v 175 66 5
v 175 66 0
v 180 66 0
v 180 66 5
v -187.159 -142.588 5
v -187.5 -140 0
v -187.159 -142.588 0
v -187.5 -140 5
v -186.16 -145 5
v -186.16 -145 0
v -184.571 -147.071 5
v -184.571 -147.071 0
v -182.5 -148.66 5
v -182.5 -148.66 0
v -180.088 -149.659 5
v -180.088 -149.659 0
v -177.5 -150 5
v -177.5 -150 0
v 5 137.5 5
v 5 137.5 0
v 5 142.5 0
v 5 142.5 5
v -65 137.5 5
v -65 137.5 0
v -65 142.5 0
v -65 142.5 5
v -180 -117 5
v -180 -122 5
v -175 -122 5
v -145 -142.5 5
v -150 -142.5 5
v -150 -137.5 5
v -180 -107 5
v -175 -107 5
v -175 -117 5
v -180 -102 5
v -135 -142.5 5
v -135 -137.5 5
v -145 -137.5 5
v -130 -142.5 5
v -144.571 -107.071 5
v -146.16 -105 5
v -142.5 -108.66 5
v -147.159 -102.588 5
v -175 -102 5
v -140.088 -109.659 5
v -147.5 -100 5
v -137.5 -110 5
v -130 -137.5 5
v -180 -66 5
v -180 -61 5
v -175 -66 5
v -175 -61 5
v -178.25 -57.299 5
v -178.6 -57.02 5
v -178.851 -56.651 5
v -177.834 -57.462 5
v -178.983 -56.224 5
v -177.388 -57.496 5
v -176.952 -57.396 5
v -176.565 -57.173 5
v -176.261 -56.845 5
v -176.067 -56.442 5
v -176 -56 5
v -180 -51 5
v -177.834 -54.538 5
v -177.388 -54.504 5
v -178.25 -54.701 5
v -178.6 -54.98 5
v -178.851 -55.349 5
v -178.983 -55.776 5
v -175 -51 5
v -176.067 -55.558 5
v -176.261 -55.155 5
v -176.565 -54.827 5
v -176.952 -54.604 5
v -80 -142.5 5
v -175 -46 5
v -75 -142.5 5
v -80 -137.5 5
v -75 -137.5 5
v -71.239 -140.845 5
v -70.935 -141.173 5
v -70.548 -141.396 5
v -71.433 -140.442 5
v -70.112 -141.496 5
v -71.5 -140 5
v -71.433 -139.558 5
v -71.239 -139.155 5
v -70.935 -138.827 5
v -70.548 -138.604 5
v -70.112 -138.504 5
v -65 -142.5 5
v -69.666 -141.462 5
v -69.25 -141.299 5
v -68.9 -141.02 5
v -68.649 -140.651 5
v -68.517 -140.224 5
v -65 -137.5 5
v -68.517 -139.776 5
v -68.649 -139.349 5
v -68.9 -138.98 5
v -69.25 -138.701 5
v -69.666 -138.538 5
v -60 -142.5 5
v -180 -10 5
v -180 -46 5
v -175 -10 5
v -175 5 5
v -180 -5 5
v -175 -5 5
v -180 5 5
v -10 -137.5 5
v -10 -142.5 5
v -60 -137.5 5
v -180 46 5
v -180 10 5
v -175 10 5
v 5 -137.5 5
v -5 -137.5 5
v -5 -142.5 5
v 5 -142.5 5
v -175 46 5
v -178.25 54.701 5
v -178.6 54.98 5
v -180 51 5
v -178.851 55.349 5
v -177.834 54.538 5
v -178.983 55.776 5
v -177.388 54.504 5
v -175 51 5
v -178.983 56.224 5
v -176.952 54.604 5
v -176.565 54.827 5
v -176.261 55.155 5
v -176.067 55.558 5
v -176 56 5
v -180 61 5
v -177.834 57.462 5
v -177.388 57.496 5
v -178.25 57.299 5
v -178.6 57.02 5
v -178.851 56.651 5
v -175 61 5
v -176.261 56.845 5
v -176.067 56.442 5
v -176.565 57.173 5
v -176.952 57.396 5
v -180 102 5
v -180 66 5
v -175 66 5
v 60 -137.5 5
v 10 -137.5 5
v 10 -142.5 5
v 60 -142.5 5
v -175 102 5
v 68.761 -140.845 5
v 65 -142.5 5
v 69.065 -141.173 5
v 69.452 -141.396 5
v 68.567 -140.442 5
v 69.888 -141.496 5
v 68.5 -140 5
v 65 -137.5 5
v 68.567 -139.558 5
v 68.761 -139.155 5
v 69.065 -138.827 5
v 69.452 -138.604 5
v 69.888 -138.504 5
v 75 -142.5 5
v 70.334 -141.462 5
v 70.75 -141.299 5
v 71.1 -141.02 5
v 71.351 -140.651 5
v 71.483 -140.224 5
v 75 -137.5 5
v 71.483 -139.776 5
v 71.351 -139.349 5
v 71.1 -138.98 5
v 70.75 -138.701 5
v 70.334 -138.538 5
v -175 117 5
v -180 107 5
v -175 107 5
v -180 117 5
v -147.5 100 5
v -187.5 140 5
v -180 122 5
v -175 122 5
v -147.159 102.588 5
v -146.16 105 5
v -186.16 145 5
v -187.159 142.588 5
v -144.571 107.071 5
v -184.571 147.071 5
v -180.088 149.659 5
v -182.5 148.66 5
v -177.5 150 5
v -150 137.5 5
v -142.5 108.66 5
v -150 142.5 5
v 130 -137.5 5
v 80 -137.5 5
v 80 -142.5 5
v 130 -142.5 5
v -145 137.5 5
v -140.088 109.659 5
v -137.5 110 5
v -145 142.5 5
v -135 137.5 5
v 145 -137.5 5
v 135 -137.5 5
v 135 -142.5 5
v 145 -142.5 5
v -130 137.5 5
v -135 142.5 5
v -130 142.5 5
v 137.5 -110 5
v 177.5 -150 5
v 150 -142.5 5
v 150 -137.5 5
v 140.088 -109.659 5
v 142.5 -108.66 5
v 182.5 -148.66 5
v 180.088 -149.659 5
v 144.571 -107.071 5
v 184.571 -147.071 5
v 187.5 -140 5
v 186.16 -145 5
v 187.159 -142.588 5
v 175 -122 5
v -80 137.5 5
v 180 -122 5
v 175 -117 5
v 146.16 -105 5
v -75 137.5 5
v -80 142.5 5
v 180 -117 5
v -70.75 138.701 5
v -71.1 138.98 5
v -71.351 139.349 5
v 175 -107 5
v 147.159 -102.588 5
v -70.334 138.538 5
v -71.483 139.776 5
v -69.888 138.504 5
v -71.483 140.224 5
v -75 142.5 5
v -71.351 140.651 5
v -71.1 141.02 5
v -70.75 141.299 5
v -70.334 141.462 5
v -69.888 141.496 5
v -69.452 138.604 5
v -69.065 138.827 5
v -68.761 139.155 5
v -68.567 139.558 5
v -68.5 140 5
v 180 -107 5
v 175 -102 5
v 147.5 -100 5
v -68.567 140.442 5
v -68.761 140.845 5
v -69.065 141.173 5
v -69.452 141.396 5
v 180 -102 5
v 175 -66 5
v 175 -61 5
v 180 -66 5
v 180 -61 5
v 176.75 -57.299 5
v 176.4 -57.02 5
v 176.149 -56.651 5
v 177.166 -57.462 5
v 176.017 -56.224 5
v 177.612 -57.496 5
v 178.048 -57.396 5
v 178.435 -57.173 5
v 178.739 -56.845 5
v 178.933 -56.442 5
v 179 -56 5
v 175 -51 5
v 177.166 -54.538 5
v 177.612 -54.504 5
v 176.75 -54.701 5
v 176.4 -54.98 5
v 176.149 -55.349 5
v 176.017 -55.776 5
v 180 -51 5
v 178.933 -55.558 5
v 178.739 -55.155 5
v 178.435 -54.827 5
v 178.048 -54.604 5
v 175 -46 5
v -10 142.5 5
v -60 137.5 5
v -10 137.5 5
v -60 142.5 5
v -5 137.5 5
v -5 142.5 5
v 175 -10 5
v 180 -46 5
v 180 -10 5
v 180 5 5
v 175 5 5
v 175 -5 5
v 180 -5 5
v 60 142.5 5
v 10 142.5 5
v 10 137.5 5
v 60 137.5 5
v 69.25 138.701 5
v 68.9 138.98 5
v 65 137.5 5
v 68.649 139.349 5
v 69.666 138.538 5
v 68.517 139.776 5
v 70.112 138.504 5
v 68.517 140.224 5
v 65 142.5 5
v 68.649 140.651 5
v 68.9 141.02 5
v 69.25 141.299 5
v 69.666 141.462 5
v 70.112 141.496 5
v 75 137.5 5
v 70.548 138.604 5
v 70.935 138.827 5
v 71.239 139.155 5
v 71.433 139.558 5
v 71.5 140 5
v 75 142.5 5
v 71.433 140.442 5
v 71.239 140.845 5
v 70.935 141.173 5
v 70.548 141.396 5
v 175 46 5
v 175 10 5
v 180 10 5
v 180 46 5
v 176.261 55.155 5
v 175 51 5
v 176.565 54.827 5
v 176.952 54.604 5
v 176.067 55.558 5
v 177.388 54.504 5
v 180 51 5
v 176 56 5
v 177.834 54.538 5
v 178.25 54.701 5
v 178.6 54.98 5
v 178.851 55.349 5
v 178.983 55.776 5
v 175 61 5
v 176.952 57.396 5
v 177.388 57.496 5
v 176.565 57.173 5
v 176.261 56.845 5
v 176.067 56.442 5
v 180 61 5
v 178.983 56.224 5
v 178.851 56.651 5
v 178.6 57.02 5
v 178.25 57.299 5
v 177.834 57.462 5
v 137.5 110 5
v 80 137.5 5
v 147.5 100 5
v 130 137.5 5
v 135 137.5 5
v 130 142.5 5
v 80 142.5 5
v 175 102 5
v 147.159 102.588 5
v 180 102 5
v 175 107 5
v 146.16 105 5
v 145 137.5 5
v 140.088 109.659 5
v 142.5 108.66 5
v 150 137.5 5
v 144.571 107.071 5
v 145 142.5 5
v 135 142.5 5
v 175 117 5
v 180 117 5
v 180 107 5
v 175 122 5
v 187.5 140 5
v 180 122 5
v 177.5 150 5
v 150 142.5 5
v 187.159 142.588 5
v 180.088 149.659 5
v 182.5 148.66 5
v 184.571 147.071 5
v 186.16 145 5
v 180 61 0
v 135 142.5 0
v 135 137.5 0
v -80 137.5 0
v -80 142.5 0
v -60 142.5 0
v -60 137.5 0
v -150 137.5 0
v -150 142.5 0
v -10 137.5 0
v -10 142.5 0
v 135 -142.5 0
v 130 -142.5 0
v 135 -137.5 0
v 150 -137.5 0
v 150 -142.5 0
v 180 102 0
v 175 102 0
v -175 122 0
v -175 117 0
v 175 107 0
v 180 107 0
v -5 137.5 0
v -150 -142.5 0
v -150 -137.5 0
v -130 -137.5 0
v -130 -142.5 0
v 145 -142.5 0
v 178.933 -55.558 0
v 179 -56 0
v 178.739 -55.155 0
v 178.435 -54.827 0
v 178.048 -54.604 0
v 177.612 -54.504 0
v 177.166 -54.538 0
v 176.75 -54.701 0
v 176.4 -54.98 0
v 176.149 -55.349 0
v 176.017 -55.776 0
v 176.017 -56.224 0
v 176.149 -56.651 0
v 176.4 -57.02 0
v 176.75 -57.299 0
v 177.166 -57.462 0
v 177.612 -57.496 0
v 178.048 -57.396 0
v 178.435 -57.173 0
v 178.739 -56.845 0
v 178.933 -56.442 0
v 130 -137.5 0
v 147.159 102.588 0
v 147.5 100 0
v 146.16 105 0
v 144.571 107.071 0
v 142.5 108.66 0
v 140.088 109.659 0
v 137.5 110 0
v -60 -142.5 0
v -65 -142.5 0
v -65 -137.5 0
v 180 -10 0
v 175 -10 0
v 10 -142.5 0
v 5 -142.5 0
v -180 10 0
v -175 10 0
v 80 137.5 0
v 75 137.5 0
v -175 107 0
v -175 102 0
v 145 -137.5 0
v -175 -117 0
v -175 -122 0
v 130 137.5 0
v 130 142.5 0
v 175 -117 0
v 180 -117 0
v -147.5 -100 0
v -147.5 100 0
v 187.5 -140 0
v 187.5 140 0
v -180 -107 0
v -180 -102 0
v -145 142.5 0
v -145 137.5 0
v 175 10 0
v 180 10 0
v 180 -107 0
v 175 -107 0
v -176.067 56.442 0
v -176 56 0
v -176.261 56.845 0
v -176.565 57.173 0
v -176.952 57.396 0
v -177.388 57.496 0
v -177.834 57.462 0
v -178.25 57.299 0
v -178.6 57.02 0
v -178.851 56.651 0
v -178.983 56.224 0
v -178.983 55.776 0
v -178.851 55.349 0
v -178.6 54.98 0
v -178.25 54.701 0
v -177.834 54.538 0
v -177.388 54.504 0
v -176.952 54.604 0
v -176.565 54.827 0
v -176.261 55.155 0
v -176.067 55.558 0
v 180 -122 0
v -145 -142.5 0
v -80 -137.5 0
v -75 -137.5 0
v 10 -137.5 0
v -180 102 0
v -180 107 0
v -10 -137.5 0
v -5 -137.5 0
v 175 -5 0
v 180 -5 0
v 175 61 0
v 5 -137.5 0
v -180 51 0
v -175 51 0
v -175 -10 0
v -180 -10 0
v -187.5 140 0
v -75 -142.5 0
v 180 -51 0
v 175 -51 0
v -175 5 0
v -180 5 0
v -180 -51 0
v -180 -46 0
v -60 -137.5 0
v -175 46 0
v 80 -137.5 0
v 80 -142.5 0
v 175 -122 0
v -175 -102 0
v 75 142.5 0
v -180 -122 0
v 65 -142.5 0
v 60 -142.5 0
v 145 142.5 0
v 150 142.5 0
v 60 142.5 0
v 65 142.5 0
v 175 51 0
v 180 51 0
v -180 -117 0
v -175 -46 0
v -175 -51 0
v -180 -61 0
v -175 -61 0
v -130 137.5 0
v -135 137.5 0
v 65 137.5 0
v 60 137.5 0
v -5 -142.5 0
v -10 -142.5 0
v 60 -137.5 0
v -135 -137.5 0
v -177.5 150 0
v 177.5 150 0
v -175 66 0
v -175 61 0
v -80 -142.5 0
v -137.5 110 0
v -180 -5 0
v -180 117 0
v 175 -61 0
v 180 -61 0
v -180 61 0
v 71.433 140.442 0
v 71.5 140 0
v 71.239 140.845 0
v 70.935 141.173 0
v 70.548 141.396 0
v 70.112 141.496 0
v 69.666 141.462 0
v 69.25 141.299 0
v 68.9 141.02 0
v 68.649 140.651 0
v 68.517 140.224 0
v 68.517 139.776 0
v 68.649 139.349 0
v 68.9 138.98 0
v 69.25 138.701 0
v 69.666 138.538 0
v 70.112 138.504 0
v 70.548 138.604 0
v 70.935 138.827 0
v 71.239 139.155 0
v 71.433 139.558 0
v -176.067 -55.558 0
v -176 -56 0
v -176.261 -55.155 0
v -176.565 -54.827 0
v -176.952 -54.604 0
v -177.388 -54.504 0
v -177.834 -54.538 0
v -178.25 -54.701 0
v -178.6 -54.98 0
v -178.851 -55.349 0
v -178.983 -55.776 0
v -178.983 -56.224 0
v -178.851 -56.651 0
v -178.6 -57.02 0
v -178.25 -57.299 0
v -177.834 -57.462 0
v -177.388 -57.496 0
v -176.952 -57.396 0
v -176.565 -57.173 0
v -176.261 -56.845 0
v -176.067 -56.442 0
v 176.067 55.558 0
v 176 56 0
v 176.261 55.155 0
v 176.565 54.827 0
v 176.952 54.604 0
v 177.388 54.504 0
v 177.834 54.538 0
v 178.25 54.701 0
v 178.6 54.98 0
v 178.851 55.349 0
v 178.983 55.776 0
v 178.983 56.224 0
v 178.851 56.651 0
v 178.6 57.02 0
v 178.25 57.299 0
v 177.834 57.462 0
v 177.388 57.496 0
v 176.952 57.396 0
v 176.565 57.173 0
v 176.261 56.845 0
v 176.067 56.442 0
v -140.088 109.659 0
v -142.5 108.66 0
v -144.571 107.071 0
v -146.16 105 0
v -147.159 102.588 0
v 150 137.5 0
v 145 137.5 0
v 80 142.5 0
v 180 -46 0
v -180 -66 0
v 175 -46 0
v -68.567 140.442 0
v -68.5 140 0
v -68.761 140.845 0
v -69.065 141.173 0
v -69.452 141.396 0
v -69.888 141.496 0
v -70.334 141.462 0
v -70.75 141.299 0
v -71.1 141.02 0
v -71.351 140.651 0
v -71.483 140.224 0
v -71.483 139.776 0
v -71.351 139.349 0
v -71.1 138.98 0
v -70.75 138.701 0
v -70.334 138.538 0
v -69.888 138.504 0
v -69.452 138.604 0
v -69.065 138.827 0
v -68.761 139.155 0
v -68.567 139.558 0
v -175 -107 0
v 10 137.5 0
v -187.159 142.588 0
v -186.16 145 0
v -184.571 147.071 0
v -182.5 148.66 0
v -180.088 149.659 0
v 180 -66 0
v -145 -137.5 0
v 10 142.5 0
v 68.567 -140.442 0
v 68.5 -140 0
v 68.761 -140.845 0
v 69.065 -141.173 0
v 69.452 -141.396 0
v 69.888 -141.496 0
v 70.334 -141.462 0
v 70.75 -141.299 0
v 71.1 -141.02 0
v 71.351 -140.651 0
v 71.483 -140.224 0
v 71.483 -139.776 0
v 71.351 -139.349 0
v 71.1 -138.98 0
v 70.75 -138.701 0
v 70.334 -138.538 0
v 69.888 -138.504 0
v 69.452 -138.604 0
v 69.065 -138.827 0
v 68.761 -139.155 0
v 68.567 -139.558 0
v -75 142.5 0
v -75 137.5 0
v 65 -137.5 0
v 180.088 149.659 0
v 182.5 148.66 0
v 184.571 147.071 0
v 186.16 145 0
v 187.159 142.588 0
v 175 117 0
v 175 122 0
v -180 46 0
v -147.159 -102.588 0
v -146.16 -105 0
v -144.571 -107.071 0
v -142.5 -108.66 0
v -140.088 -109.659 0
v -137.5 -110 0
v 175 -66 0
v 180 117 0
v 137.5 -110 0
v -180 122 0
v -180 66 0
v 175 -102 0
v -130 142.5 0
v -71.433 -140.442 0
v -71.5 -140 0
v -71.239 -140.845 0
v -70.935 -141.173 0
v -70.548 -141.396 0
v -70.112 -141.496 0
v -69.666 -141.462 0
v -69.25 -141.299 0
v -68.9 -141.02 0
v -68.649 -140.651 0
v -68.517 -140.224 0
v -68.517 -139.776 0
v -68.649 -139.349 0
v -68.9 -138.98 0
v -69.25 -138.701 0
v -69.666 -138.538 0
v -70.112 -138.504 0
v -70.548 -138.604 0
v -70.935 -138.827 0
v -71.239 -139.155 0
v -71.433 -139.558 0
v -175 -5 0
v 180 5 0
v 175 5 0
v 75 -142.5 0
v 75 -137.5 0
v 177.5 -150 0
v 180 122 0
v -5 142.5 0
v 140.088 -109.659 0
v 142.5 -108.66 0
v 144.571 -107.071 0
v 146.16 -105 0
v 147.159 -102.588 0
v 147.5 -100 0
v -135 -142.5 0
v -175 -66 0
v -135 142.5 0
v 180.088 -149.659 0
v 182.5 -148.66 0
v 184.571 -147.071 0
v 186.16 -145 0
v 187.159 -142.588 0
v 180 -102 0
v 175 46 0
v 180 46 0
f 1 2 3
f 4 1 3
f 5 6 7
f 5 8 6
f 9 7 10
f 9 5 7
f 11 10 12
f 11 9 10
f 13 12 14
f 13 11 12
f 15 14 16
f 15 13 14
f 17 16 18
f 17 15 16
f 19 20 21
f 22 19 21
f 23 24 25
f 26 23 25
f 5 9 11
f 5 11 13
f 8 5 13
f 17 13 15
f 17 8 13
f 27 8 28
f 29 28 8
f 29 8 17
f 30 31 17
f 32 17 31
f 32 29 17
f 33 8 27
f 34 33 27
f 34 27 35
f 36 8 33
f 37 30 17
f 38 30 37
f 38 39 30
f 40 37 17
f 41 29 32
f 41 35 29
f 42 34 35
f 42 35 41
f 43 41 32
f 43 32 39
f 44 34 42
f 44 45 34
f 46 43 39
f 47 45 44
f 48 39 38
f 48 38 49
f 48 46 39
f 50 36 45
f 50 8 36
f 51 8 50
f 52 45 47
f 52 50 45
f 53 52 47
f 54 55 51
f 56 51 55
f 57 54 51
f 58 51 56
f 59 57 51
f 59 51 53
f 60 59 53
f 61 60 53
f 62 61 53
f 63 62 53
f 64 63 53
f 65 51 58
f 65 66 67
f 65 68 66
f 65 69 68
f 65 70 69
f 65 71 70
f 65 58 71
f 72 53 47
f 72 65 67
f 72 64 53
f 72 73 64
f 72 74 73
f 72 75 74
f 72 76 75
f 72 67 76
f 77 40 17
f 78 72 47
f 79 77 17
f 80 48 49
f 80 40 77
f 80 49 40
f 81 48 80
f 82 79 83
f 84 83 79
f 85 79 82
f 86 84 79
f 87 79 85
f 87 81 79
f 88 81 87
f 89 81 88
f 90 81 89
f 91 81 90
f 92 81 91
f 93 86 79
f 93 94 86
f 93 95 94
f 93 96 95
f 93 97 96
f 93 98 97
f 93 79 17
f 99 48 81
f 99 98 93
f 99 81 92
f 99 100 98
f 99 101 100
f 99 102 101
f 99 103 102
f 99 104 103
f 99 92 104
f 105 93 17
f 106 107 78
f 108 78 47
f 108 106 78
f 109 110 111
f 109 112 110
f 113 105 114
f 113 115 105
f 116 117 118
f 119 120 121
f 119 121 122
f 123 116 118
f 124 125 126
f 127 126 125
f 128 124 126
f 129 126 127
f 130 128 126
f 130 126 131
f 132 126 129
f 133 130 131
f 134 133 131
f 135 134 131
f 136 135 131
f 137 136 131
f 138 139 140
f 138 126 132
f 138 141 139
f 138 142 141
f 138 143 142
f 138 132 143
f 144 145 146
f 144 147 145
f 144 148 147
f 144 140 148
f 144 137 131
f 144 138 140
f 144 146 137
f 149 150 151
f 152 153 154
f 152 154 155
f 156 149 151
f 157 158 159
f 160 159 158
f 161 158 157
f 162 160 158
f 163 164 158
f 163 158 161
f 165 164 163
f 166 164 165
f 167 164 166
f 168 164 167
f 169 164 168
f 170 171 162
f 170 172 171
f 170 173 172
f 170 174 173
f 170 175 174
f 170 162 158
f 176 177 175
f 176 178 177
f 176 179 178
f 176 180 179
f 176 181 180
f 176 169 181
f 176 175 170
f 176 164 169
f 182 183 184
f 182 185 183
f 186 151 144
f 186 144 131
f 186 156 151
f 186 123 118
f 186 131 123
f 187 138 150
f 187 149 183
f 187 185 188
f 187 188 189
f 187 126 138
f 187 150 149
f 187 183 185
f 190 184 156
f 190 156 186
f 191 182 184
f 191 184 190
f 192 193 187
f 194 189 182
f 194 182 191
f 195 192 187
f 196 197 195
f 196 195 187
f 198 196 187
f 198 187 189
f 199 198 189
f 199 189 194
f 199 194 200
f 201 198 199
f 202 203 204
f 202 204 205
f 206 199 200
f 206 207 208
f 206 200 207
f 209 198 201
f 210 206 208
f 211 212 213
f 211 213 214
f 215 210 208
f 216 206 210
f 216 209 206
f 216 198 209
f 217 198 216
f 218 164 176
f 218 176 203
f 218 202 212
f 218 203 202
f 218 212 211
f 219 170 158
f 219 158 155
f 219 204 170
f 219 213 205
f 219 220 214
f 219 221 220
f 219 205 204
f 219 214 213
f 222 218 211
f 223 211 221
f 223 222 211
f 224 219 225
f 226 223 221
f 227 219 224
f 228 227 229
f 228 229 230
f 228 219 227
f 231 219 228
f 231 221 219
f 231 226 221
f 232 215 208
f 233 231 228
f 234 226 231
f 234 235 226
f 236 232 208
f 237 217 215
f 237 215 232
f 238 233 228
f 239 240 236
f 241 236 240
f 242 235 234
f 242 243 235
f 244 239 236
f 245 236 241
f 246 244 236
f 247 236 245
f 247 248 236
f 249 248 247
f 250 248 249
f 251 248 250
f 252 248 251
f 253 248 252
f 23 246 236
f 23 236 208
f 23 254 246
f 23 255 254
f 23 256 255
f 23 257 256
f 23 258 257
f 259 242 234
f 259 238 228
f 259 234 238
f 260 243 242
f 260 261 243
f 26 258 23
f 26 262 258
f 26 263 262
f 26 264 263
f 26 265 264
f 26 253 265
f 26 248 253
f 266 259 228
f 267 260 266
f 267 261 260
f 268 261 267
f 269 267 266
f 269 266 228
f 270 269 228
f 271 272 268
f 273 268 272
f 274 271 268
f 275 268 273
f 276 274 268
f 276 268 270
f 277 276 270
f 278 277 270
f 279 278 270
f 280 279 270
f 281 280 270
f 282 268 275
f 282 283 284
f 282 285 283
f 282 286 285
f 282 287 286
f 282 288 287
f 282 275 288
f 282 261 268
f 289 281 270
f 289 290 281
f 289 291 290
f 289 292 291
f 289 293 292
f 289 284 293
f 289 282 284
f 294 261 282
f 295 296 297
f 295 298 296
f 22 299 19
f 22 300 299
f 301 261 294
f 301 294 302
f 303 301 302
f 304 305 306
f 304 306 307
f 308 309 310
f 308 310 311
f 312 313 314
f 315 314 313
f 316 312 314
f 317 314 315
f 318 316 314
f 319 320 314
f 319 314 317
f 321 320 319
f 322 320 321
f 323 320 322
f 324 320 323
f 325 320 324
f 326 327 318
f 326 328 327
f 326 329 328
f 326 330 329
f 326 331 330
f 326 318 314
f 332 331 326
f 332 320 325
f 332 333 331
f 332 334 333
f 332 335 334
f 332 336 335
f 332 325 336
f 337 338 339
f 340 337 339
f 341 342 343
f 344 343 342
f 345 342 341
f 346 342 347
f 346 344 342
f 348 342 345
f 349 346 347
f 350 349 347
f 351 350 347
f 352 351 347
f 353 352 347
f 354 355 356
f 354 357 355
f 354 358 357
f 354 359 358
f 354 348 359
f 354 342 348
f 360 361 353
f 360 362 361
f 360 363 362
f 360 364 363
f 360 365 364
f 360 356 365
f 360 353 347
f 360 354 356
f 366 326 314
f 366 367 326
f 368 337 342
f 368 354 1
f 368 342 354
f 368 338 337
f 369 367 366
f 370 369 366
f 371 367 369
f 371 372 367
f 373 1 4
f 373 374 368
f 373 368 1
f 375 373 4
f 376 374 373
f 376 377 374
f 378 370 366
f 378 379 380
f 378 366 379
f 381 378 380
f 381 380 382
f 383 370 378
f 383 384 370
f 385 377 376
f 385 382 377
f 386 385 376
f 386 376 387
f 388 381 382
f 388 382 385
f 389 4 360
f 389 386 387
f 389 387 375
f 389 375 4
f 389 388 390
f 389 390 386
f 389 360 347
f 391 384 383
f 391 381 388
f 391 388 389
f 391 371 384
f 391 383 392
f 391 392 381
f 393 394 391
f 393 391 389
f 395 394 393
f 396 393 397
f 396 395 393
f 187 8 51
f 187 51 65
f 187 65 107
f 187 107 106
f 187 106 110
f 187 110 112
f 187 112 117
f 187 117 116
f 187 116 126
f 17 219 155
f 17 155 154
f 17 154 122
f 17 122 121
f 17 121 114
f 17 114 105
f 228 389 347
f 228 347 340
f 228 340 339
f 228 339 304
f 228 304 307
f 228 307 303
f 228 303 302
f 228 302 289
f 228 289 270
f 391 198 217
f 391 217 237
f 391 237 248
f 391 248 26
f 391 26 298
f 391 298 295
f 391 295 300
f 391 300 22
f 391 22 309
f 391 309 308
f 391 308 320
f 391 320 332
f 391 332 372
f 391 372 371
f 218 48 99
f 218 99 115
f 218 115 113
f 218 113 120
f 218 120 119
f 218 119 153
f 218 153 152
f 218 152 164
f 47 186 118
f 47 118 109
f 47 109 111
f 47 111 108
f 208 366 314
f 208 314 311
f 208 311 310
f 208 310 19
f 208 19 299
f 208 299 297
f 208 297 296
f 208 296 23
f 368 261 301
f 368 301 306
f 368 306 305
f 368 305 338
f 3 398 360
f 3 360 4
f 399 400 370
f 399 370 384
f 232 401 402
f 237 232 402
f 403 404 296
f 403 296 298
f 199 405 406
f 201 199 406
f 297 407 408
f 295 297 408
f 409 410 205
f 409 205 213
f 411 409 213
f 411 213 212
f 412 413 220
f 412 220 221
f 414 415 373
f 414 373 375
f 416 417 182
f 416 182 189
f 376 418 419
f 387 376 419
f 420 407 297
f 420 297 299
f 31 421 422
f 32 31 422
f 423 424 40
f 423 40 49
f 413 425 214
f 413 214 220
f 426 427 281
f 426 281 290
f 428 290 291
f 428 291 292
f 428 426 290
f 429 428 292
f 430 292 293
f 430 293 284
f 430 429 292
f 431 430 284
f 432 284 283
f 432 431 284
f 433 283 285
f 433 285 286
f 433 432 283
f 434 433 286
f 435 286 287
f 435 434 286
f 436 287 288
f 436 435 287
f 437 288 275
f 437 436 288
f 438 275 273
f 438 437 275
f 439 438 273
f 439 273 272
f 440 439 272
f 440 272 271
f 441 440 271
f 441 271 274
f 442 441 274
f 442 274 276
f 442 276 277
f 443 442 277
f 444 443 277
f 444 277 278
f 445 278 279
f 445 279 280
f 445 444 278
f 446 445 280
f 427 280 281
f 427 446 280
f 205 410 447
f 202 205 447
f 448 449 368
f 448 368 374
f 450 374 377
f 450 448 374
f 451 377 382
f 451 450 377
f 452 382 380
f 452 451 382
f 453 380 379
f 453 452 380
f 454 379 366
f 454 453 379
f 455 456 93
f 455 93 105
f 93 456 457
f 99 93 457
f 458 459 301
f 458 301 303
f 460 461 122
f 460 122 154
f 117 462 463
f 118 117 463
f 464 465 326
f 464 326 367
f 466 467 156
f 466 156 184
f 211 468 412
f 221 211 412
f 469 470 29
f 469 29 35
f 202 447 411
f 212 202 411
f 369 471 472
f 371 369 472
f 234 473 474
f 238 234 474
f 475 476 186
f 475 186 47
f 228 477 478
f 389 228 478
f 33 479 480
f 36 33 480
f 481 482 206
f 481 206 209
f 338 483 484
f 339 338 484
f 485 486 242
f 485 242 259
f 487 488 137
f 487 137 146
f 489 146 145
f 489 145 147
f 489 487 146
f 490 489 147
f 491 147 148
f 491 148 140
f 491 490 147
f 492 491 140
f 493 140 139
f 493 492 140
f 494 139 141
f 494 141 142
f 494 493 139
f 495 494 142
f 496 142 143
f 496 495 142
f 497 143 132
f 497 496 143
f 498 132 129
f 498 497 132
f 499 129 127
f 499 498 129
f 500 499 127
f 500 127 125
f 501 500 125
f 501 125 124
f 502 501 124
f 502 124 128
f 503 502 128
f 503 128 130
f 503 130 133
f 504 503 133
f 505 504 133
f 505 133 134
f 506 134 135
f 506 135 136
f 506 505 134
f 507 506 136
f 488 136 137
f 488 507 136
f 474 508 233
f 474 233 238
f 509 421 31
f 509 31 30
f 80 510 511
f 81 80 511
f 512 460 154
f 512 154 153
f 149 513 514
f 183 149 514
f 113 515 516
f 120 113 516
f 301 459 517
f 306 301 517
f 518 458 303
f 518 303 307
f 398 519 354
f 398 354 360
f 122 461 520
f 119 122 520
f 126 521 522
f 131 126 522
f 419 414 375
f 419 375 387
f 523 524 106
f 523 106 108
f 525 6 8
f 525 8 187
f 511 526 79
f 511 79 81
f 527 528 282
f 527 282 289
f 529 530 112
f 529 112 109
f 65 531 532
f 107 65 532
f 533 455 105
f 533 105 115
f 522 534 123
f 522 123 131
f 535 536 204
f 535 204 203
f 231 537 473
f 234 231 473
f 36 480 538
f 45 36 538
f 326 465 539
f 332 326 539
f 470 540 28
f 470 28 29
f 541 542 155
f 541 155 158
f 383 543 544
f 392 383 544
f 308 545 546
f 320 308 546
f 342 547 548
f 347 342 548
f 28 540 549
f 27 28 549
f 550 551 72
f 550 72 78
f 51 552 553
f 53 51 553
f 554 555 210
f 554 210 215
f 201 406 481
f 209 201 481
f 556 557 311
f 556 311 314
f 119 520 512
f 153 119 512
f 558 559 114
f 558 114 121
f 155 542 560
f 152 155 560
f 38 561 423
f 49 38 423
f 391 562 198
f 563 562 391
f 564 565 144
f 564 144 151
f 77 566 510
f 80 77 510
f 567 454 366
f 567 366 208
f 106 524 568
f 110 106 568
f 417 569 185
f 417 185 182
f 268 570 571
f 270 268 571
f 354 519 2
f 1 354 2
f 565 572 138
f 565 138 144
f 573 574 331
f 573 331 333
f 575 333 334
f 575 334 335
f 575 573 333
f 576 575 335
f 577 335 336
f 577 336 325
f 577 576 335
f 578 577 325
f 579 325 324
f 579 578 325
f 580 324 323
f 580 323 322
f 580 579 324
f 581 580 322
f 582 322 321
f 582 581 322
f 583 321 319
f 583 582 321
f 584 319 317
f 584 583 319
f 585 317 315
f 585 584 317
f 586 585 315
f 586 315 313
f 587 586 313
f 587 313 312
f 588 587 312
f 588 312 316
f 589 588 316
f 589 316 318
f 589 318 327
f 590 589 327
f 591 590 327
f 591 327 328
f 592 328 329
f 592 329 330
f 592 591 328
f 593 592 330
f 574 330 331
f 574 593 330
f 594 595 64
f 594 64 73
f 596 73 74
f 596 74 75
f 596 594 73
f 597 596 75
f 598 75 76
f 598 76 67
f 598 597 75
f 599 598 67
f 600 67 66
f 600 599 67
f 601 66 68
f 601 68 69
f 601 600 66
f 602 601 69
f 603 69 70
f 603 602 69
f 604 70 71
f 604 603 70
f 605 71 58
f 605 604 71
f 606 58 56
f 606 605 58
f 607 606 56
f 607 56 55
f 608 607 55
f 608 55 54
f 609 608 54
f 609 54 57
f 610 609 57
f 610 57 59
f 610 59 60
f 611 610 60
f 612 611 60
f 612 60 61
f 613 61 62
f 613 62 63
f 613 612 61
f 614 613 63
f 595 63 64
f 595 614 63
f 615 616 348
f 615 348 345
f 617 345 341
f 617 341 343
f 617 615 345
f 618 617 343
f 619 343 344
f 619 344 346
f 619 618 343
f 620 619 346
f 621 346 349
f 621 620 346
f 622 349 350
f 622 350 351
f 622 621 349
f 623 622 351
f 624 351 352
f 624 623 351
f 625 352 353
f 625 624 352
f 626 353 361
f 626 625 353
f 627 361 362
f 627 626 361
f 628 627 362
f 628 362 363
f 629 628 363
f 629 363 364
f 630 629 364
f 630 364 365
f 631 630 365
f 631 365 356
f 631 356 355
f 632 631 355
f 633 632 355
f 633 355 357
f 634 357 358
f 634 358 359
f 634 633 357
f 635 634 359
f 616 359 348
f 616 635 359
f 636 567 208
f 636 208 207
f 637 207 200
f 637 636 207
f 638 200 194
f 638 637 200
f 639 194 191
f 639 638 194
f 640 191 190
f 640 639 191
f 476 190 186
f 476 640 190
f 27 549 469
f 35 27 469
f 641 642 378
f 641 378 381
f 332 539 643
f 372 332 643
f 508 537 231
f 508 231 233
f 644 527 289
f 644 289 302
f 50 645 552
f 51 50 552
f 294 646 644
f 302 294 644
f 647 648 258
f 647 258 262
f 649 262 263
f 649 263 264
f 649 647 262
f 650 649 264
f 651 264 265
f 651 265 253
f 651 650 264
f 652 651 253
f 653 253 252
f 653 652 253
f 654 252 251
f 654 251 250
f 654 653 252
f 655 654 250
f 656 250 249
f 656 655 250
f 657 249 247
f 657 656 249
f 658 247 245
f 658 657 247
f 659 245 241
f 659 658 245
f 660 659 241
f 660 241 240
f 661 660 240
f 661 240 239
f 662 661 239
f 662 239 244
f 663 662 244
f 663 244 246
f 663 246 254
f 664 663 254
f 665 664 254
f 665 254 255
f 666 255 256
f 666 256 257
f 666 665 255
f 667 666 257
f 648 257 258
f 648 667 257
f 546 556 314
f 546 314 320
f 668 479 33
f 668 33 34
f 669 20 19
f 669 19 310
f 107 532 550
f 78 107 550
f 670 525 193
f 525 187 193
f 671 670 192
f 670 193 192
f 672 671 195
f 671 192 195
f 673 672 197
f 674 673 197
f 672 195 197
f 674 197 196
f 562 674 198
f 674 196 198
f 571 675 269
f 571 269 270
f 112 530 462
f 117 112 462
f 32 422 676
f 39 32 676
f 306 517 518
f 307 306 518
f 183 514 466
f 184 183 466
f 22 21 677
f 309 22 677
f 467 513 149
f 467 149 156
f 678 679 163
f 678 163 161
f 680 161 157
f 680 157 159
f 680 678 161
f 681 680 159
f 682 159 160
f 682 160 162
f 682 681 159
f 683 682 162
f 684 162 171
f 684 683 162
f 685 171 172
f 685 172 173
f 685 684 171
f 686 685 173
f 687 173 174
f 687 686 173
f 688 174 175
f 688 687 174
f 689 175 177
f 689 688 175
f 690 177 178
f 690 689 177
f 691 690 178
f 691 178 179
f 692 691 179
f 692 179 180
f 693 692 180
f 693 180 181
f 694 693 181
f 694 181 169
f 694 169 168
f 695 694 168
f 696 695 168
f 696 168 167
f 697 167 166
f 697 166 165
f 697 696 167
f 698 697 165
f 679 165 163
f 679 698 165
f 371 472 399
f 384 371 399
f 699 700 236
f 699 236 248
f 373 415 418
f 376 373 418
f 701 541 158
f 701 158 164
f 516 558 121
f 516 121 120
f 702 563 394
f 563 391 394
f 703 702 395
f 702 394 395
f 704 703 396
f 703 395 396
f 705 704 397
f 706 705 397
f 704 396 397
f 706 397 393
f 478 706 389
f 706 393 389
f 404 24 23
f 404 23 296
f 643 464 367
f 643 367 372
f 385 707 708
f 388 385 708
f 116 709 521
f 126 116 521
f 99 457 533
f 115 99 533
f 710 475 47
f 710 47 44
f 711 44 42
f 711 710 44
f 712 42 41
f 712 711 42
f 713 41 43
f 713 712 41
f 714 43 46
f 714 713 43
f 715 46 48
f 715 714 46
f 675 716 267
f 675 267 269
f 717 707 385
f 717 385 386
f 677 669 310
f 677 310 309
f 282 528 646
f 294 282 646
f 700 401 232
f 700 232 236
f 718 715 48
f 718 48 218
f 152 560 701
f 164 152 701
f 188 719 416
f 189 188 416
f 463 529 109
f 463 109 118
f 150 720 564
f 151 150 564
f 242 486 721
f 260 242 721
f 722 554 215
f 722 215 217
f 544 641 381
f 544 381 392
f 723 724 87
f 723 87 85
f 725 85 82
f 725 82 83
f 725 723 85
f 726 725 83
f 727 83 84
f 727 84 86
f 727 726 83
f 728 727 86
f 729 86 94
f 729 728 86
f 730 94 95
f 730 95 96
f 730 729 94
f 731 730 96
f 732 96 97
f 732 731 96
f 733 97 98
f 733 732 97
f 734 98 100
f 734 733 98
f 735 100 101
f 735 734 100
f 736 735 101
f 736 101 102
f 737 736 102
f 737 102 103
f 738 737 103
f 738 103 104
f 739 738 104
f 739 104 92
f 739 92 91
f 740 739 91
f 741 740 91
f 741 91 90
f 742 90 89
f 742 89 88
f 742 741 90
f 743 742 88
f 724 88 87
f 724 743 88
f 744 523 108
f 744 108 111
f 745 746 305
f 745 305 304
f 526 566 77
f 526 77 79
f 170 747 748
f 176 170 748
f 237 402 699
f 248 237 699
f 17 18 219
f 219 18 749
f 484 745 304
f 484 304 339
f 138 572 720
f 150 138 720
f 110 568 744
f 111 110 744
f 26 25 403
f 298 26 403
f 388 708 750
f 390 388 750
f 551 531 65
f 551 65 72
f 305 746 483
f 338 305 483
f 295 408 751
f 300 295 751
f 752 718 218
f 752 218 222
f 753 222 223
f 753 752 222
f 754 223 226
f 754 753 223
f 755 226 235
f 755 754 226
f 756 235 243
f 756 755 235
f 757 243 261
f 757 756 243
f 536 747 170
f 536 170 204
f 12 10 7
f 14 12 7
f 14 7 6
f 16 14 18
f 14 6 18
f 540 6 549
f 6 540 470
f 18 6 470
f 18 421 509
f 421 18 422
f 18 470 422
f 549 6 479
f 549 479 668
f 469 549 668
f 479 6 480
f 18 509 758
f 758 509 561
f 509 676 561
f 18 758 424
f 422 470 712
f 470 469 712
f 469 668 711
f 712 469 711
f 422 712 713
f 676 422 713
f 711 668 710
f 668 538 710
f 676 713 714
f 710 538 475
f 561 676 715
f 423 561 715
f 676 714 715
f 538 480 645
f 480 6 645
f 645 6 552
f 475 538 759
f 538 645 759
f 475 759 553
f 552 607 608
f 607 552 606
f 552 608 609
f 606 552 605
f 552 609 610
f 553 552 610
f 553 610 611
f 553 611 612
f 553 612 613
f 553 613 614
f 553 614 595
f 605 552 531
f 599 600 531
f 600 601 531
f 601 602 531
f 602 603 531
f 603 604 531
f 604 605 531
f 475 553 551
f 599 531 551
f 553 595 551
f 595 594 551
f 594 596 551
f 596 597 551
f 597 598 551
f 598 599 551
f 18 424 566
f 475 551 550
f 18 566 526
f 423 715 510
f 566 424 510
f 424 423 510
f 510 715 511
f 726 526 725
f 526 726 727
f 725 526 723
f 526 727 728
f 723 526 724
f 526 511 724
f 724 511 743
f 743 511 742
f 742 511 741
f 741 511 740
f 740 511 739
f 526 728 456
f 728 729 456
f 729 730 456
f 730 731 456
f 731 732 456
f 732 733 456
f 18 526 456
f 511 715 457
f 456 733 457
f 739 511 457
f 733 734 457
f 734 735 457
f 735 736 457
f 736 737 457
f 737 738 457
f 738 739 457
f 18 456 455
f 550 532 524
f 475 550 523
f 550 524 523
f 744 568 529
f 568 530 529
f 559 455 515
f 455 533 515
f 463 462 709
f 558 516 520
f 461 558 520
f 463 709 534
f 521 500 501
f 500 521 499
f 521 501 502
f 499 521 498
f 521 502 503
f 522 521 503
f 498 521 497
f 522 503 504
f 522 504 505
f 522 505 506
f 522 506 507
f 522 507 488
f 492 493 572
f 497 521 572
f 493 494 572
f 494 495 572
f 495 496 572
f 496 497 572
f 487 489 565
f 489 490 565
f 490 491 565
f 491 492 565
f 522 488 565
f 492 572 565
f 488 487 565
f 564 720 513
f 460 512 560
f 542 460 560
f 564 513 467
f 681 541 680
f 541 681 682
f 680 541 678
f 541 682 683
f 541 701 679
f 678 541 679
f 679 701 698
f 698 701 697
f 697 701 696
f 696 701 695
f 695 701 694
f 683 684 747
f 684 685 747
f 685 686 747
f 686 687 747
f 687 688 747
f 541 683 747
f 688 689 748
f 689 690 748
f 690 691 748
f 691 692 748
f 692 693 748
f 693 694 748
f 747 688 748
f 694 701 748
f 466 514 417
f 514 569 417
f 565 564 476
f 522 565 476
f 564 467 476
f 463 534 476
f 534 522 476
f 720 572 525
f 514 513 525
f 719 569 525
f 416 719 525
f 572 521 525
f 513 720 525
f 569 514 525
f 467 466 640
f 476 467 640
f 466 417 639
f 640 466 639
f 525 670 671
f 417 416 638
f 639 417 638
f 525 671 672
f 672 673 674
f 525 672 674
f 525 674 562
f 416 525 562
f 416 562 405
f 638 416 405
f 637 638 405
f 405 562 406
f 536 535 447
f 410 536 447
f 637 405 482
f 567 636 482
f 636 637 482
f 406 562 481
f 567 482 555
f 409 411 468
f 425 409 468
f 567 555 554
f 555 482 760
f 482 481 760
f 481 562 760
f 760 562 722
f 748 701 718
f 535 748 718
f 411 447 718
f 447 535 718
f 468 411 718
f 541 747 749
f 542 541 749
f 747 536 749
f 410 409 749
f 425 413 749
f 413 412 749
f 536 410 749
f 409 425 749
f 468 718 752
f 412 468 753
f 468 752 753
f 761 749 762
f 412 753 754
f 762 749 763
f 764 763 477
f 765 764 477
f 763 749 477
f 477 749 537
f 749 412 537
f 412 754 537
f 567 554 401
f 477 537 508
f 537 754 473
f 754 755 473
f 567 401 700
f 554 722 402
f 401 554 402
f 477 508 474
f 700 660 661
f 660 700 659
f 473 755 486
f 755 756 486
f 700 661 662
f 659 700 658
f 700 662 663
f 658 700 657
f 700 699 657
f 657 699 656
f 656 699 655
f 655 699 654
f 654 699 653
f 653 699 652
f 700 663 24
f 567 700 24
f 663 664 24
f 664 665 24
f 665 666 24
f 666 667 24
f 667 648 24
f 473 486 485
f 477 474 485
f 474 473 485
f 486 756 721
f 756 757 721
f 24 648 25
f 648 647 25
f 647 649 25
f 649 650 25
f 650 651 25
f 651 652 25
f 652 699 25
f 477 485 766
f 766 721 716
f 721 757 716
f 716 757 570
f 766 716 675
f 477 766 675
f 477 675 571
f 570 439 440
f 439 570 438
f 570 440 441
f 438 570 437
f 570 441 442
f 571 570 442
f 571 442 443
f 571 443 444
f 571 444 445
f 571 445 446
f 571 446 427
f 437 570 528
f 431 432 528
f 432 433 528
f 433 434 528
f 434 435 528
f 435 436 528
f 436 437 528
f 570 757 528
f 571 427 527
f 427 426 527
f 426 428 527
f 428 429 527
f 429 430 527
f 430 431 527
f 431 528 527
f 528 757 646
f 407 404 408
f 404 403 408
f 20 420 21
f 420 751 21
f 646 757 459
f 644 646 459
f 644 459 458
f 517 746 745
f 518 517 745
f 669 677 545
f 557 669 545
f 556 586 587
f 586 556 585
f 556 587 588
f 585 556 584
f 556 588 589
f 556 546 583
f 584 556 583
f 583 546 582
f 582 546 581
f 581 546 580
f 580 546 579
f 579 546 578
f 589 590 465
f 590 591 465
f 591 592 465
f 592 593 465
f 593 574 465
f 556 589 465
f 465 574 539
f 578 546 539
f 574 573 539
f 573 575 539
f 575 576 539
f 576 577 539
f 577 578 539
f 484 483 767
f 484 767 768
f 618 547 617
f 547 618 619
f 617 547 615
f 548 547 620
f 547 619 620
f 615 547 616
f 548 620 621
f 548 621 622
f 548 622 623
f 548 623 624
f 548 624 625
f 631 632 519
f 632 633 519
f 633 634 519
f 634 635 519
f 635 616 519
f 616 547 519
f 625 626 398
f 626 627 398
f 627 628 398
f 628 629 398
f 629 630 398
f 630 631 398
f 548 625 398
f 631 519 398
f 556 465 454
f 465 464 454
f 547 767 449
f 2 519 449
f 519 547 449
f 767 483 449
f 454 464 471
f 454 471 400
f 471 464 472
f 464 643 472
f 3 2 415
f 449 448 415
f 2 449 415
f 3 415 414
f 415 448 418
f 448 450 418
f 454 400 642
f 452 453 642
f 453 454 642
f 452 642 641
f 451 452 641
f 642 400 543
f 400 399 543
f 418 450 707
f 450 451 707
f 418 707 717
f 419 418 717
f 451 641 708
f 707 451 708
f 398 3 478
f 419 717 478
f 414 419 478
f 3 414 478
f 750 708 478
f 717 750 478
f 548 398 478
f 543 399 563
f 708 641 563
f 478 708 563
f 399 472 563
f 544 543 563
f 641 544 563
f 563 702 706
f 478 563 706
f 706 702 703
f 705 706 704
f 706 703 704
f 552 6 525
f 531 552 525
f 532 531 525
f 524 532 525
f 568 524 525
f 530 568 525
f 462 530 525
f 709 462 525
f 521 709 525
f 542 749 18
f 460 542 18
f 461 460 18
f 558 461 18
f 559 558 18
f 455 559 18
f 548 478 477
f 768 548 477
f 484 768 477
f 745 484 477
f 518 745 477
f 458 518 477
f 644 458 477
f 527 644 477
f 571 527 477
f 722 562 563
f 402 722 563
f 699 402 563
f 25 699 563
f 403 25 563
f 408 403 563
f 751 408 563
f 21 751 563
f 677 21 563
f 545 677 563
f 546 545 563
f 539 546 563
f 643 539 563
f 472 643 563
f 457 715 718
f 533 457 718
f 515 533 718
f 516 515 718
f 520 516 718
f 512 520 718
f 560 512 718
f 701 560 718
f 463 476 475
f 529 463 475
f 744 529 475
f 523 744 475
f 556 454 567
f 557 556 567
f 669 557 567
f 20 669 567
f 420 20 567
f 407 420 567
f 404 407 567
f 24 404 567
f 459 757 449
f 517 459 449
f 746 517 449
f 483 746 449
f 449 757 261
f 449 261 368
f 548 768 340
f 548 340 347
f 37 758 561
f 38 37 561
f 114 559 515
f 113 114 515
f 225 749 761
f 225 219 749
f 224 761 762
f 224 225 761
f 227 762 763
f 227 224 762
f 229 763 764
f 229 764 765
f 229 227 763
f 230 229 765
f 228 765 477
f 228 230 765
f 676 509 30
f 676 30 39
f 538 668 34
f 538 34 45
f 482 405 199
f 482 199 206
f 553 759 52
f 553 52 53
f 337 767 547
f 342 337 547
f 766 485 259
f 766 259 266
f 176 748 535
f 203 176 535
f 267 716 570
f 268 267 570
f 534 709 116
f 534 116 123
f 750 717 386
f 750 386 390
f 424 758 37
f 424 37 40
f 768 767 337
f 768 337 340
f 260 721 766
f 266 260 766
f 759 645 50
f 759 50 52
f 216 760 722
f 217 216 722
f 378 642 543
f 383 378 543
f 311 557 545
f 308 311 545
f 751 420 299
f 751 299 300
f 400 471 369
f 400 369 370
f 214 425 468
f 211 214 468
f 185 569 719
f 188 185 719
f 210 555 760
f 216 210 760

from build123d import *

# Parameters (mm, degrees)
SKETCH1_W           = 375
SKETCH1_H           = 300
SKETCH1_R           = 1.5
SKETCH1_W_2         = 5
SKETCH1_H_2         = 5
BOSS_EXTRUDE2_DEPTH = 5
FILLET1_R           = 10


with BuildPart() as part:
    # Sketch1 → Boss-Extrude2 (new body)
    with BuildSketch(Plane.XY):
        Rectangle(SKETCH1_W, SKETCH1_H)
        with Locations((-177.5, 56)):
            Circle(SKETCH1_R, mode=Mode.SUBTRACT)
        with Locations(Location((177.5, 56, 0), (0, 0, 180))):
            Circle(SKETCH1_R, mode=Mode.SUBTRACT)
        with Locations((-70, 140)):
            Circle(SKETCH1_R, mode=Mode.SUBTRACT)
        with Locations((70, 140)):
            Circle(SKETCH1_R, mode=Mode.SUBTRACT)
        with Locations(Location((70, -140, 0), (0, 0, 180))):
            Circle(SKETCH1_R, mode=Mode.SUBTRACT)
        with Locations(Location((-70, -140, 0), (0, 0, 180))):
            Circle(SKETCH1_R, mode=Mode.SUBTRACT)
        with Locations((177.5, -56)):
            Circle(SKETCH1_R, mode=Mode.SUBTRACT)
        with Locations((-177.5, -56)):
            Circle(SKETCH1_R, mode=Mode.SUBTRACT)
        with Locations((-177.5, -7.5)):
            Rectangle(SKETCH1_W_2, SKETCH1_H_2, mode=Mode.SUBTRACT)
        with Locations((-177.5, 7.5)):
            Rectangle(SKETCH1_W_2, SKETCH1_H_2, mode=Mode.SUBTRACT)
        with Locations((177.5, -63.5)):
            Rectangle(SKETCH1_W_2, SKETCH1_H_2, mode=Mode.SUBTRACT)
        with Locations((-177.5, 104.5)):
            Rectangle(SKETCH1_W_2, SKETCH1_H_2, mode=Mode.SUBTRACT)
        with Locations((-177.5, 119.5)):
            Rectangle(SKETCH1_W_2, SKETCH1_H_2, mode=Mode.SUBTRACT)
        with Locations((-177.5, 48.5)):
            Rectangle(SKETCH1_W_2, SKETCH1_H_2, mode=Mode.SUBTRACT)
        with Locations((-177.5, 63.5)):
            Rectangle(SKETCH1_W_2, SKETCH1_H_2, mode=Mode.SUBTRACT)
        with Locations((177.5, -48.5)):
            Rectangle(SKETCH1_W_2, SKETCH1_H_2, mode=Mode.SUBTRACT)
        with Locations((177.5, 63.5)):
            Rectangle(SKETCH1_W_2, SKETCH1_H_2, mode=Mode.SUBTRACT)
        with Locations((177.5, 48.5)):
            Rectangle(SKETCH1_W_2, SKETCH1_H_2, mode=Mode.SUBTRACT)
        with Locations((177.5, 119.5)):
            Rectangle(SKETCH1_W_2, SKETCH1_H_2, mode=Mode.SUBTRACT)
        with Locations((177.5, 104.5)):
            Rectangle(SKETCH1_W_2, SKETCH1_H_2, mode=Mode.SUBTRACT)
        with Locations((177.5, 7.5)):
            Rectangle(SKETCH1_W_2, SKETCH1_H_2, mode=Mode.SUBTRACT)
        with Locations((177.5, -7.5)):
            Rectangle(SKETCH1_W_2, SKETCH1_H_2, mode=Mode.SUBTRACT)
        with Locations((-147.5, 140)):
            Rectangle(SKETCH1_W_2, SKETCH1_H_2, mode=Mode.SUBTRACT)
        with Locations((-132.5, 140)):
            Rectangle(SKETCH1_W_2, SKETCH1_H_2, mode=Mode.SUBTRACT)
        with Locations((-77.5, 140)):
            Rectangle(SKETCH1_W_2, SKETCH1_H_2, mode=Mode.SUBTRACT)
        with Locations((-62.5, 140)):
            Rectangle(SKETCH1_W_2, SKETCH1_H_2, mode=Mode.SUBTRACT)
        with Locations((-7.5, 140)):
            Rectangle(SKETCH1_W_2, SKETCH1_H_2, mode=Mode.SUBTRACT)
        with Locations((7.5, 140)):
            Rectangle(SKETCH1_W_2, SKETCH1_H_2, mode=Mode.SUBTRACT)
        with Locations((62.5, 140)):
            Rectangle(SKETCH1_W_2, SKETCH1_H_2, mode=Mode.SUBTRACT)
        with Locations((77.5, 140)):
            Rectangle(SKETCH1_W_2, SKETCH1_H_2, mode=Mode.SUBTRACT)
        with Locations((132.5, 140)):
            Rectangle(SKETCH1_W_2, SKETCH1_H_2, mode=Mode.SUBTRACT)
        with Locations((147.5, 140)):
            Rectangle(SKETCH1_W_2, SKETCH1_H_2, mode=Mode.SUBTRACT)
        with Locations((147.5, -140)):
            Rectangle(SKETCH1_W_2, SKETCH1_H_2, mode=Mode.SUBTRACT)
        with Locations((132.5, -140)):
            Rectangle(SKETCH1_W_2, SKETCH1_H_2, mode=Mode.SUBTRACT)
        with Locations((77.5, -140)):
            Rectangle(SKETCH1_W_2, SKETCH1_H_2, mode=Mode.SUBTRACT)
        with Locations((62.5, -140)):
            Rectangle(SKETCH1_W_2, SKETCH1_H_2, mode=Mode.SUBTRACT)
        with Locations((7.5, -140)):
            Rectangle(SKETCH1_W_2, SKETCH1_H_2, mode=Mode.SUBTRACT)
        with Locations((-7.5, -140)):
            Rectangle(SKETCH1_W_2, SKETCH1_H_2, mode=Mode.SUBTRACT)
        with Locations((-62.5, -140)):
            Rectangle(SKETCH1_W_2, SKETCH1_H_2, mode=Mode.SUBTRACT)
        with Locations((-77.5, -140)):
            Rectangle(SKETCH1_W_2, SKETCH1_H_2, mode=Mode.SUBTRACT)
        with Locations((-132.5, -140)):
            Rectangle(SKETCH1_W_2, SKETCH1_H_2, mode=Mode.SUBTRACT)
        with Locations((-147.5, -140)):
            Rectangle(SKETCH1_W_2, SKETCH1_H_2, mode=Mode.SUBTRACT)
        with BuildLine():
            Line((-137.5, -110), (137.5, -110))
            ThreePointArc((137.5, -110), (144.571067812, -107.071067812), (147.5, -100))
            Line((147.5, -100), (147.5, 100))
            ThreePointArc((147.5, 100), (144.571067812, 107.071067812), (137.5, 110))
            Line((137.5, 110), (-137.5, 110))
            ThreePointArc((-137.5, 110), (-144.571067812, 107.071067812), (-147.5, 100))
            Line((-147.5, 100), (-147.5, -100))
            ThreePointArc((-147.5, -100), (-144.571067812, -107.071067812), (-137.5, -110))
        make_face(mode=Mode.SUBTRACT)
        with Locations((177.5, -119.5)):
            Rectangle(SKETCH1_W_2, SKETCH1_H_2, mode=Mode.SUBTRACT)
        with Locations((177.5, -104.5)):
            Rectangle(SKETCH1_W_2, SKETCH1_H_2, mode=Mode.SUBTRACT)
        with Locations((-177.5, -119.5)):
            Rectangle(SKETCH1_W_2, SKETCH1_H_2, mode=Mode.SUBTRACT)
        with Locations((-177.5, -104.5)):
            Rectangle(SKETCH1_W_2, SKETCH1_H_2, mode=Mode.SUBTRACT)
        with Locations((-177.5, -63.5)):
            Rectangle(SKETCH1_W_2, SKETCH1_H_2, mode=Mode.SUBTRACT)
        with Locations((-177.5, -48.5)):
            Rectangle(SKETCH1_W_2, SKETCH1_H_2, mode=Mode.SUBTRACT)
    extrude(amount=BOSS_EXTRUDE2_DEPTH)

    # Fillet1
    fillet1_edges = [part.edges().sort_by_distance(p)[0] for p in [
        (187.5, -150, 2.5),
        (-187.5, -150, 2.5),
        (-187.5, 150, 2.5),
        (187.5, 150, 2.5),
    ]]
    fillet(fillet1_edges, radius=FILLET1_R)


solid = part.part
